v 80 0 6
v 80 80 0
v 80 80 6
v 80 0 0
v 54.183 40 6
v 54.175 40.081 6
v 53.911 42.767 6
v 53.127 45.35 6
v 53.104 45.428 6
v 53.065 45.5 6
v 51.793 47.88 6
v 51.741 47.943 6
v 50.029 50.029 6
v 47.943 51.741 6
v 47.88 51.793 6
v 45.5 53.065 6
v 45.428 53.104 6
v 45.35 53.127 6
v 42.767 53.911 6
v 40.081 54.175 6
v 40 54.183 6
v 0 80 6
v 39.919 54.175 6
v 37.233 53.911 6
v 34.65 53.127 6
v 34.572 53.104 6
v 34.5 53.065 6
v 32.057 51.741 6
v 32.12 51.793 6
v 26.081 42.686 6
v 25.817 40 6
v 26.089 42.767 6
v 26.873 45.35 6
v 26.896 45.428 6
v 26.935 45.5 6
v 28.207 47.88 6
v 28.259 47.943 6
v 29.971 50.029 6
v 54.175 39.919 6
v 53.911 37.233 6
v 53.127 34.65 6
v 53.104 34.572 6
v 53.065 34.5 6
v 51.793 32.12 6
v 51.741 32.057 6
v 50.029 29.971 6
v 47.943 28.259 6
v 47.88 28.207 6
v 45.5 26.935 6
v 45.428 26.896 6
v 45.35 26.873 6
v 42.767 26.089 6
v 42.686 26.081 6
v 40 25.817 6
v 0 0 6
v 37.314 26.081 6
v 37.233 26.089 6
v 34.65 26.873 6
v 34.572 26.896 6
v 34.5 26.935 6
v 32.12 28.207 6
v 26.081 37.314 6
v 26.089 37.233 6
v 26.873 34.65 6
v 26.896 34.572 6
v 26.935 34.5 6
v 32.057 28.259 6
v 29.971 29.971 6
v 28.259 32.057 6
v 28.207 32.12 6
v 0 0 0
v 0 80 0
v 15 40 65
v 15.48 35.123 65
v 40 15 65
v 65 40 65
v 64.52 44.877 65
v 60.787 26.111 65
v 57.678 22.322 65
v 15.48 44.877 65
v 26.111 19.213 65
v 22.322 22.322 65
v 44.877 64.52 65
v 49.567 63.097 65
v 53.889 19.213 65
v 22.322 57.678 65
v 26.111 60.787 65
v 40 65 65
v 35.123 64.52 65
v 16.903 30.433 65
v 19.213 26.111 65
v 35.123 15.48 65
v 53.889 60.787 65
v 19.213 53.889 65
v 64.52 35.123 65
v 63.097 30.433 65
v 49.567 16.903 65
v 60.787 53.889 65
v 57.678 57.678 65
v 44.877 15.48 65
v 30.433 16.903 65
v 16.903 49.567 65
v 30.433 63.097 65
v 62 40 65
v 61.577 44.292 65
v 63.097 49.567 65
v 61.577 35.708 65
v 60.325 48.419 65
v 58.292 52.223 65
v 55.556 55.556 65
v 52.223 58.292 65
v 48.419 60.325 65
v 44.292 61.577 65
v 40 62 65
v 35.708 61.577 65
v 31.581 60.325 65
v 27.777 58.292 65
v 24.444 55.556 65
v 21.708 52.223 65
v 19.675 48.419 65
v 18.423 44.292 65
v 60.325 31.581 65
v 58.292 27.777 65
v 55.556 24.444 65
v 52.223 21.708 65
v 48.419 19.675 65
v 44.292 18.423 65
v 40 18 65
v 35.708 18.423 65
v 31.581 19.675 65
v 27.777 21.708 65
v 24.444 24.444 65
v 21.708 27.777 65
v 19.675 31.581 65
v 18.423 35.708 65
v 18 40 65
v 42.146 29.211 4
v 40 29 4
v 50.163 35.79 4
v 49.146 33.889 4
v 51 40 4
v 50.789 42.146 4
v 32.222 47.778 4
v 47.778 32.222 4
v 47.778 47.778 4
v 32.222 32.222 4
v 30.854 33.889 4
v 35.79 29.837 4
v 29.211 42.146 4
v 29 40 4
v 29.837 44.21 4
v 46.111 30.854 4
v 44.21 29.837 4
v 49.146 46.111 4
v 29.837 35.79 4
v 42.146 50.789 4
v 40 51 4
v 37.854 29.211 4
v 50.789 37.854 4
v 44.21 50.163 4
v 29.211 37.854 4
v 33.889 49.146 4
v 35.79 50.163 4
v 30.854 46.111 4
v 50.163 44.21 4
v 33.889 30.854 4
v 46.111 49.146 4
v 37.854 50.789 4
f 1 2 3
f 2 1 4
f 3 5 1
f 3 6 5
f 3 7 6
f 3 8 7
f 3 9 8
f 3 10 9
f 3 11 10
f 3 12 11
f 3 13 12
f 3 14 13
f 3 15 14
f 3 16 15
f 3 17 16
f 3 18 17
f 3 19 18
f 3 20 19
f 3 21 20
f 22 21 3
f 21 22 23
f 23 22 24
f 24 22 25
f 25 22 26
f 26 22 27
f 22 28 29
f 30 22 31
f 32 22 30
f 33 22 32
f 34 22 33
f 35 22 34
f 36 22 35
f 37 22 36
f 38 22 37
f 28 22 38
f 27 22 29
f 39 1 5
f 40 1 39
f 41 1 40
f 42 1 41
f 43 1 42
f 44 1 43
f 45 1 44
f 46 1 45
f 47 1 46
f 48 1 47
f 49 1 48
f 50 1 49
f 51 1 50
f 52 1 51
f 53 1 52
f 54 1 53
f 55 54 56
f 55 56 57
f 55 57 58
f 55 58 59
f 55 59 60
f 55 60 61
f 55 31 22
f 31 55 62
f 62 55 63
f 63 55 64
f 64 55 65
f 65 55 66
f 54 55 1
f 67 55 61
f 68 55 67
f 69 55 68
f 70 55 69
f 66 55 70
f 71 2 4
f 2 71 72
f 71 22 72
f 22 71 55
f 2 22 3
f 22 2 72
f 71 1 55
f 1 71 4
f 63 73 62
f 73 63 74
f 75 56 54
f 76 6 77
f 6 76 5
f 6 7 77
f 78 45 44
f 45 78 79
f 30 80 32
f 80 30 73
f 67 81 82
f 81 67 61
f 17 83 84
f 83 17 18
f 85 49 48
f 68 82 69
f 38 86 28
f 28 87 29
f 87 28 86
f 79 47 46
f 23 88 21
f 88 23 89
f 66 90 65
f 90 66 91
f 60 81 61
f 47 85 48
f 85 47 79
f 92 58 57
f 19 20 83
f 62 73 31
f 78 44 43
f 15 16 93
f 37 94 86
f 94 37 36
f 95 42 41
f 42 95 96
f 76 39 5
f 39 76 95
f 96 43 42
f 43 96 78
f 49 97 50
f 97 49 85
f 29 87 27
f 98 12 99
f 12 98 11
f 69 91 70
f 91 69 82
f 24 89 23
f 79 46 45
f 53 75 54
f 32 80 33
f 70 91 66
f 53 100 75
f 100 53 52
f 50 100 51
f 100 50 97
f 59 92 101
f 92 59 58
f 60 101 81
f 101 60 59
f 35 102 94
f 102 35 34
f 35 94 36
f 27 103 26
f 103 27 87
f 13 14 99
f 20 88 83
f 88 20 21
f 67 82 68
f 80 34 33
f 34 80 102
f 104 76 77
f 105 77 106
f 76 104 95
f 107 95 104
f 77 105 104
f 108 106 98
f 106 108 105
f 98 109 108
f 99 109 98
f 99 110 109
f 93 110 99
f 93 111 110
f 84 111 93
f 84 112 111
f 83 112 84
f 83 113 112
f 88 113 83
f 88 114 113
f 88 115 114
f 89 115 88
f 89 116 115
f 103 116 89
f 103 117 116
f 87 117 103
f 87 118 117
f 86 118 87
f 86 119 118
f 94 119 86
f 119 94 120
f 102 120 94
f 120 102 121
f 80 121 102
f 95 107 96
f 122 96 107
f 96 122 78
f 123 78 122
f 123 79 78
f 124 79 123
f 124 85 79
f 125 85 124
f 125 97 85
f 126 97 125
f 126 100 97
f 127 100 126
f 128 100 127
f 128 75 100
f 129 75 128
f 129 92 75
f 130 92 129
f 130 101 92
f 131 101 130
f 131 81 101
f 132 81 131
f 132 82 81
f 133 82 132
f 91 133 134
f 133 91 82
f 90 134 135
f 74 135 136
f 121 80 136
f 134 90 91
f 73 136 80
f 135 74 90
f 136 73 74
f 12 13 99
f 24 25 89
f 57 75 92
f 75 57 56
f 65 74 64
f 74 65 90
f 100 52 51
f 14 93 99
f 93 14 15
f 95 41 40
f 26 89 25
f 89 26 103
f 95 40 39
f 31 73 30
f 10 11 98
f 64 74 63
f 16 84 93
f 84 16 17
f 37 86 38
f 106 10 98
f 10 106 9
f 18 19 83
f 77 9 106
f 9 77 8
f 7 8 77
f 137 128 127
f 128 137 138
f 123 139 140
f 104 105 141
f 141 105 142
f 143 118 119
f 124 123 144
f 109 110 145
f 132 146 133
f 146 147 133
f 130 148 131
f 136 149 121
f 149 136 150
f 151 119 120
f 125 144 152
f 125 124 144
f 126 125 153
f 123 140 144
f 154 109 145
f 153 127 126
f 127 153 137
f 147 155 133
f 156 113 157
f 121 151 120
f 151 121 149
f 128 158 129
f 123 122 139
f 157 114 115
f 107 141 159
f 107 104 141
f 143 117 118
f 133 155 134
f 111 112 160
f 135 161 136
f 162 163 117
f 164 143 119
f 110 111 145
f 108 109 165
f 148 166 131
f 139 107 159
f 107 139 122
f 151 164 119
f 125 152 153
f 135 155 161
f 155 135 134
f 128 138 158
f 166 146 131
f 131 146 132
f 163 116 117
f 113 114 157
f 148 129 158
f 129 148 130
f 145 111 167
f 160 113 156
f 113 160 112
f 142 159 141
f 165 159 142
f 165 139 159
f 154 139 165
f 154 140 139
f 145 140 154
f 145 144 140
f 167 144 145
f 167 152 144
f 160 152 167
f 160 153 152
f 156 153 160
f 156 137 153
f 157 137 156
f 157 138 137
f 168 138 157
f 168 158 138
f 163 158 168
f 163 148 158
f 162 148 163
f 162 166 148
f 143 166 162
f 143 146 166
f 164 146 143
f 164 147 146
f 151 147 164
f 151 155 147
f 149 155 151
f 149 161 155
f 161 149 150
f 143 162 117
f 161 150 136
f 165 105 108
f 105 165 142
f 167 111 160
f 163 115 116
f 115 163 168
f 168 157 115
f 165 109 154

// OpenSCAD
$fn = 32;

// ----------------------------------------------------------------------
// Hopper: funnel with square flange
// ----------------------------------------------------------------------

// --- parameters (mm) ---
fl = 80;                  // flange side, X and Y
fl_t = 6;                 // flange thickness
cone_h = 60;              // cone height above the flange
top_d = 50;               // cone mouth diameter
bot_d = 28;               // cone spout diameter
wall = 3;                 // cone wall thickness

bore_d = bot_d - 2 * wall;  // spout bore diameter
total_h = fl_t + cone_h - 1;  // overall height

difference() {
  union() {
    cube([fl, fl, fl_t]);
    translate([fl / 2, fl / 2, fl_t - 1])
      cylinder(h = cone_h, d1 = bot_d, d2 = top_d);
  }
  translate([fl / 2, fl / 2, fl_t - 2])
    cylinder(h = cone_h + 1, d1 = bore_d, d2 = top_d - 2 * wall);
}
